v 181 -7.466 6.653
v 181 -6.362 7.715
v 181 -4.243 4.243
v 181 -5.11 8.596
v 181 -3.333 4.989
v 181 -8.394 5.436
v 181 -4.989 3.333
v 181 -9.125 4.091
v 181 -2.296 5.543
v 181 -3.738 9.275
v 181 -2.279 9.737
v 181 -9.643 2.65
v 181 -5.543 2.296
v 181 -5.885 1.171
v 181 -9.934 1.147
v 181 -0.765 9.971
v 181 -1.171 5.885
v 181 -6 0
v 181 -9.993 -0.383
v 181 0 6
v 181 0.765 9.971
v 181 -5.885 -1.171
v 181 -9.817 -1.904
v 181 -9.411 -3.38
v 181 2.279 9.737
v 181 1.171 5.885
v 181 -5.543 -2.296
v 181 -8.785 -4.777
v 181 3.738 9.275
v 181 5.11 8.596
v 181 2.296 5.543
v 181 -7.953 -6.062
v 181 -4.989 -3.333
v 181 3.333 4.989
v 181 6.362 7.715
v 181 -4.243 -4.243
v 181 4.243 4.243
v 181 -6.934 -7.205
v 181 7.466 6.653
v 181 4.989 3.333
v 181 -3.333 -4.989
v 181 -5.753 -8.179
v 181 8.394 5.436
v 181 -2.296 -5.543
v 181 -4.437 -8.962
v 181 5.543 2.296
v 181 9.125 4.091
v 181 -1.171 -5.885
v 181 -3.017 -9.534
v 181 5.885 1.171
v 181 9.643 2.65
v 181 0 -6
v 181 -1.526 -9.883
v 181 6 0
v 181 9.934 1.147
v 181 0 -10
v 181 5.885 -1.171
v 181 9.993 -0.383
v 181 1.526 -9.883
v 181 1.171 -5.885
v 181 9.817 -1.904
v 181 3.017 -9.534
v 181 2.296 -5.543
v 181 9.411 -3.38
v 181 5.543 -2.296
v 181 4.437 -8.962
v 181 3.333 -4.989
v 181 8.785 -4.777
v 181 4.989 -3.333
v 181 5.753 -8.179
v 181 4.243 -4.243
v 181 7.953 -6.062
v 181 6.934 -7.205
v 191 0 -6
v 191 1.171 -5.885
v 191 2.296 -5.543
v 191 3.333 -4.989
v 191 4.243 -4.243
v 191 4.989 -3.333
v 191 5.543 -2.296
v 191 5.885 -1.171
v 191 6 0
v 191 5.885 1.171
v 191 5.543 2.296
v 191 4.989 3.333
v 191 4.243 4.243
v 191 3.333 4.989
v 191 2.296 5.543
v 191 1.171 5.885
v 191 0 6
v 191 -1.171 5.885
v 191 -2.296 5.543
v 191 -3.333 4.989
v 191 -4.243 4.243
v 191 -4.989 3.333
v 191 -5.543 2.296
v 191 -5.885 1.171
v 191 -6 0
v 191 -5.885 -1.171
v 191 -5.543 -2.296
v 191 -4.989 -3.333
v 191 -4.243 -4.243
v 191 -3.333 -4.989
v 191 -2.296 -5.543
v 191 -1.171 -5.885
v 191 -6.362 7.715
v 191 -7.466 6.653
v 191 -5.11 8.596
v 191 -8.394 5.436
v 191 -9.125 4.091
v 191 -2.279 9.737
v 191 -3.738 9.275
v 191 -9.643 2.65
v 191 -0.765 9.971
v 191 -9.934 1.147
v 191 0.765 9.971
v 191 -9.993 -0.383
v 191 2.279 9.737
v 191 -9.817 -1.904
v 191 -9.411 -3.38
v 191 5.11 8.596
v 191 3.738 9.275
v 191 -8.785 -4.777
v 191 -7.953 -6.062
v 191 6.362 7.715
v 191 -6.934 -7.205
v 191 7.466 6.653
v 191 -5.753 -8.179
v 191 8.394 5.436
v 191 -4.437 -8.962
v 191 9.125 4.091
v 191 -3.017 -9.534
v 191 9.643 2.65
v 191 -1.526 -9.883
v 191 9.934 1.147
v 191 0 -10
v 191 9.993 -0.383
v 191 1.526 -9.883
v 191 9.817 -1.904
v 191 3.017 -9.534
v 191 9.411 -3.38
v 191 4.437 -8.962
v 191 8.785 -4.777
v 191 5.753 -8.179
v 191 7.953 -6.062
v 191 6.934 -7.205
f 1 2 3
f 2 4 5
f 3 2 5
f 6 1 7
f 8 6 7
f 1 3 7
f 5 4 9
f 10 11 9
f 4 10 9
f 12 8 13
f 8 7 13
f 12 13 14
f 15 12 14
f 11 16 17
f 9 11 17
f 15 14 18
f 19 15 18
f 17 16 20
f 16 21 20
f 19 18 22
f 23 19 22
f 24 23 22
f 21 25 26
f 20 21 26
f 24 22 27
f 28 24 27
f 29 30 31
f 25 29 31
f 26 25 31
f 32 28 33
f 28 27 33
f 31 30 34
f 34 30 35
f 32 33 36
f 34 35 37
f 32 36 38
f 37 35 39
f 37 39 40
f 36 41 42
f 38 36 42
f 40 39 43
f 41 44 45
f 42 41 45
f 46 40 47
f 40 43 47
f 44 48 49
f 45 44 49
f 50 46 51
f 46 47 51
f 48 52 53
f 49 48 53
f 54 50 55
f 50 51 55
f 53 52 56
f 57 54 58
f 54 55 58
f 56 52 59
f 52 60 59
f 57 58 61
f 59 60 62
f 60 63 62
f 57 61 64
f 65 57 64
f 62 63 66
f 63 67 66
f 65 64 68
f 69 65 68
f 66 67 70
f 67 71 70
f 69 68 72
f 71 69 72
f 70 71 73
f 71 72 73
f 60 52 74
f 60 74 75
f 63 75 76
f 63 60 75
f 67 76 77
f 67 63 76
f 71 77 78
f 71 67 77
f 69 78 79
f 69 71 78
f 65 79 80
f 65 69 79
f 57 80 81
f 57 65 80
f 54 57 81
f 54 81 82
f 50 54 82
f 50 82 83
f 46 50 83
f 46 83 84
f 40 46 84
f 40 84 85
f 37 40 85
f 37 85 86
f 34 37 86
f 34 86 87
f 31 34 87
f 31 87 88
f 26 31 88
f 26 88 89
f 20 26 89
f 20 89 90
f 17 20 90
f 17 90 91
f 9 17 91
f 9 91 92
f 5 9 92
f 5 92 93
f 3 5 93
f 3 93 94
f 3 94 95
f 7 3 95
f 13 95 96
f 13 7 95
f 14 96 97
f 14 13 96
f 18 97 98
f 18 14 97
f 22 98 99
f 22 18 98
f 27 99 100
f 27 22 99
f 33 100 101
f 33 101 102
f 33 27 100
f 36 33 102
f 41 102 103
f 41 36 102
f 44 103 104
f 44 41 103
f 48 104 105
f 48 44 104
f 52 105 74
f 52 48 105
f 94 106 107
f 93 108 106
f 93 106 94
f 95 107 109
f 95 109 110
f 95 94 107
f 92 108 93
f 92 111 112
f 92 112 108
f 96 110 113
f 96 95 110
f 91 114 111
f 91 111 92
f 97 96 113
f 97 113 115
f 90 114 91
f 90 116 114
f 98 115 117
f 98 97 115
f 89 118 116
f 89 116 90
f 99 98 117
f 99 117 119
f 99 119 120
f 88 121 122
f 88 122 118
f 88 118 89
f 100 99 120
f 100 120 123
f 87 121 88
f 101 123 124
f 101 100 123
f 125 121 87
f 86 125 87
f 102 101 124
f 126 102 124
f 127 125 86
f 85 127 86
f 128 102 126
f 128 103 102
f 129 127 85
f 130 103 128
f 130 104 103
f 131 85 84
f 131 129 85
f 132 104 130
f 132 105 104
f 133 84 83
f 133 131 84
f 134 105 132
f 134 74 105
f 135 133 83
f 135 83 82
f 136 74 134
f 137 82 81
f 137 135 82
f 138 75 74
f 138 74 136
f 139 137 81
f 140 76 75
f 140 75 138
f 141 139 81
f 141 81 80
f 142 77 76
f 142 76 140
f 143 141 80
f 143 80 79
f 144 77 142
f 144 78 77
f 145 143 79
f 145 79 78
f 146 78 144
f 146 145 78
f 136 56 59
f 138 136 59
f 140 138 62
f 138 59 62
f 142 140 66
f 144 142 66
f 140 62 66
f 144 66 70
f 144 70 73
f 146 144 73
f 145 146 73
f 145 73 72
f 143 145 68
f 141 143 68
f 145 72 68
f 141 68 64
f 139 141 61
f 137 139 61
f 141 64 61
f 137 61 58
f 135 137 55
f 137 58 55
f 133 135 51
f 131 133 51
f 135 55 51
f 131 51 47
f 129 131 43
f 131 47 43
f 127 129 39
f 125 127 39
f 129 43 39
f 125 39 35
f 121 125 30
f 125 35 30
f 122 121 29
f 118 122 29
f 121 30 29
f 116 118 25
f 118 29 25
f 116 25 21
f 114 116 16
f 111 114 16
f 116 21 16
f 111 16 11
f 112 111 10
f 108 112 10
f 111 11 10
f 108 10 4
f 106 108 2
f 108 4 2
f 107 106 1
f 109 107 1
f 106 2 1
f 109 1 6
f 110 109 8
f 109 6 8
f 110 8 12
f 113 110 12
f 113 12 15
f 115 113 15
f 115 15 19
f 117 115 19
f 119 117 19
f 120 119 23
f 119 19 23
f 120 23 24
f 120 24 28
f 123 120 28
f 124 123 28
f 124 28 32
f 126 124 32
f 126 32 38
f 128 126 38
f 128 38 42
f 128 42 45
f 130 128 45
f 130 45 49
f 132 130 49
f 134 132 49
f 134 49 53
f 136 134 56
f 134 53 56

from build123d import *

# Parameters (mm, degrees)
CYLINDER007_R           = 6
CYLINDER007_DEPTH       = 236
CYLINDER007_PITCH_ANGLE = 90
CYLINDER006_R           = 10
CYLINDER006_DEPTH       = 10
CYLINDER006_PITCH_ANGLE = 90


with BuildPart() as connector_bore:
    # Cylinder007 → Cylinder007 (new body)
    with BuildSketch(Plane.XY):
        Circle(CYLINDER007_R)
    extrude(amount=CYLINDER007_DEPTH)


with BuildPart() as connector_bore_1:
    # Cylinder007 pitch: moved
    add(connector_bore.part.rotate(Axis((0, 0, 0), (0, 1, 0)), CYLINDER007_PITCH_ANGLE))


with BuildPart() as connector_bore_2:
    # Cylinder007 placement: moved
    add(connector_bore_1.part.moved(Location((-45, 0, 0))))


with BuildPart() as cut001:
    # Cylinder006 → Cylinder006 (new body)
    with BuildSketch(Plane.XY):
        Circle(CYLINDER006_R)
    extrude(amount=CYLINDER006_DEPTH)


with BuildPart() as cut001_1:
    # Cylinder006 pitch: moved
    add(cut001.part.rotate(Axis((0, 0, 0), (0, 1, 0)), CYLINDER006_PITCH_ANGLE))


with BuildPart() as cut001_2:
    # Cylinder006 placement: moved
    add(cut001_1.part.moved(Location((181, 0, 0))))

    # Cut001: cut connector_bore
    add(connector_bore_2.part, mode=Mode.SUBTRACT)


solid = cut001_2.part
